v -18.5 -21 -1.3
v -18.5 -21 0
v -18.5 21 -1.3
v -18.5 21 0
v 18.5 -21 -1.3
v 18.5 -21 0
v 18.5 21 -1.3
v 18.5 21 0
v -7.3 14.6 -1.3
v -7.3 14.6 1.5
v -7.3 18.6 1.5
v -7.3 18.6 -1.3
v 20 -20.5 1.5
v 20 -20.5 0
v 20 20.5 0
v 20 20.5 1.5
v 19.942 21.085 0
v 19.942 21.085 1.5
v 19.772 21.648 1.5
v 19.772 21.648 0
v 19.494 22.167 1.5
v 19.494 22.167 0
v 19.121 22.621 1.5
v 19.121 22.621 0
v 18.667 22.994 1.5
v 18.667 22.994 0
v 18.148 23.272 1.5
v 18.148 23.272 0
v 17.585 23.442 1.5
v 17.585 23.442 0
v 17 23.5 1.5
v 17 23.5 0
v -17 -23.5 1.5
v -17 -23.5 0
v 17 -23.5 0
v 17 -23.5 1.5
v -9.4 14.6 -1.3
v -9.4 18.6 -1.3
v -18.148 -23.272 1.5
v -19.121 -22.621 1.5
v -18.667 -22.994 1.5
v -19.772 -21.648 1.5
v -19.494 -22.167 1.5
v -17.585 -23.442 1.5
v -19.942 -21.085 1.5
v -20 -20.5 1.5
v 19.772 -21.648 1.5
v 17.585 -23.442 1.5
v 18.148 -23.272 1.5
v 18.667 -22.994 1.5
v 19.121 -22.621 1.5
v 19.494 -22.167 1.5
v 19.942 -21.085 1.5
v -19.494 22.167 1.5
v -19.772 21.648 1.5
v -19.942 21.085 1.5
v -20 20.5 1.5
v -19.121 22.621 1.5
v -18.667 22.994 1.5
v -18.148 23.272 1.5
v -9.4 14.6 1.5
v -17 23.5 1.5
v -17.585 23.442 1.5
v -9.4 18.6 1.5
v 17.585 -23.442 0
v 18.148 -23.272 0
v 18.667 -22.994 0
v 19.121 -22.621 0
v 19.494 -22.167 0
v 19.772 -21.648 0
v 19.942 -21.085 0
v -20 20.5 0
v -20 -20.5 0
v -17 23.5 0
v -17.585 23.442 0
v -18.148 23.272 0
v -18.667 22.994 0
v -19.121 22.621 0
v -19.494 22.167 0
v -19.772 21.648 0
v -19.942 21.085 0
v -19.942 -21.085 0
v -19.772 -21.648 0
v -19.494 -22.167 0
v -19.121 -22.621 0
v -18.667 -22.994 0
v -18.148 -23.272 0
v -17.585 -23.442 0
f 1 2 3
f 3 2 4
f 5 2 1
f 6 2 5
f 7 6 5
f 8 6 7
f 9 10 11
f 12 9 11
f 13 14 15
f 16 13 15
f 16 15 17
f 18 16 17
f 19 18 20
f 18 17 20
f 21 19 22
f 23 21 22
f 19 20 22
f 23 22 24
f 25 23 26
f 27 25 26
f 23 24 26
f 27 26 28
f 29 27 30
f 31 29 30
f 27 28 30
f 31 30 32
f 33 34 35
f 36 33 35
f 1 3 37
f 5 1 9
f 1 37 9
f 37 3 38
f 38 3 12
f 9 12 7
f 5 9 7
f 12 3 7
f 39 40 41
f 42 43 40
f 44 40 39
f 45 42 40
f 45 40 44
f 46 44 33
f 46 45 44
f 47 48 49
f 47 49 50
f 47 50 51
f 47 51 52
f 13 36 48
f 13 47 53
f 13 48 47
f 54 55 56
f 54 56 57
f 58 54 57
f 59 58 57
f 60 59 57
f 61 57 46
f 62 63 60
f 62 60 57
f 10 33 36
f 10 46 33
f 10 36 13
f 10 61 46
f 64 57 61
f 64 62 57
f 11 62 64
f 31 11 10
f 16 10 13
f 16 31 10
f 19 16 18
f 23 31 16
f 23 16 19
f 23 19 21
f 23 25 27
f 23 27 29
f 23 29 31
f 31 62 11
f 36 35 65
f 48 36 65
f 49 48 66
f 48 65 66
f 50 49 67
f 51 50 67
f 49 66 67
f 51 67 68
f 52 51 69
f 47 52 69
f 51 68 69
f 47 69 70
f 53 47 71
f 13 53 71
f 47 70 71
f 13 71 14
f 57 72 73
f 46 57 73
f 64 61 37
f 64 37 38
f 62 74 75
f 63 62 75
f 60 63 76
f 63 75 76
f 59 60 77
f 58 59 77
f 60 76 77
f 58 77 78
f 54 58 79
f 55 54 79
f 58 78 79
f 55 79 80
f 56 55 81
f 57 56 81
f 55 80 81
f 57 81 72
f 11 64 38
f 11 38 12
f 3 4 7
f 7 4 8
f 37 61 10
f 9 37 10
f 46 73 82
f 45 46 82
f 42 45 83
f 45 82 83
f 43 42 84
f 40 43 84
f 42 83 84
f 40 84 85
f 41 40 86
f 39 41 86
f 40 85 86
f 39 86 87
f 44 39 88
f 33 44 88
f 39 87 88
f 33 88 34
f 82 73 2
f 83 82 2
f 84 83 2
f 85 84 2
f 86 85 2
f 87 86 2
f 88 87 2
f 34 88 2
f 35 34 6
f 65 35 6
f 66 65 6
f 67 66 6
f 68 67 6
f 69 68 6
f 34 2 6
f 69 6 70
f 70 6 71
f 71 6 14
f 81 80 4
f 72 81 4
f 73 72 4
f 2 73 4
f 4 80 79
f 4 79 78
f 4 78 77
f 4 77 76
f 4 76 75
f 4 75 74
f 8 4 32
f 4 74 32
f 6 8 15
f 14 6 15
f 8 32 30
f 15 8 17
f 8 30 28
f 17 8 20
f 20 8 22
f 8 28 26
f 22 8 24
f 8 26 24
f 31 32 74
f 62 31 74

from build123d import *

# Parameters (mm, degrees)
F1_DEPTH = 1.5
F2_W     = 37
F2_H     = 42
F3_DEPTH = 1.3
F4_W     = 2.1
F4_H     = 4
F5_DEPTH = 5.05


with BuildPart() as f1:
    # F0 (on Top) → F1 (new body)
    with BuildSketch(Plane.XY):
        with BuildLine():
            Line((17, 23.5), (-17, 23.5))
            ThreePointArc((-17, 23.5), (-19.12132, 22.62132), (-20, 20.5))
            Line((-20, 20.5), (-20, -20.5))
            ThreePointArc((-20, -20.5), (-19.12132, -22.62132), (-17, -23.5))
            Line((-17, -23.5), (17, -23.5))
            ThreePointArc((17, -23.5), (19.12132, -22.62132), (20, -20.5))
            Line((20, -20.5), (20, 20.5))
            ThreePointArc((20, 20.5), (19.12132, 22.62132), (17, 23.5))
        make_face()
    extrude(amount=F1_DEPTH)

    # F2 (on Top) → F3 (join)
    with BuildSketch(Plane.XY):
        Rectangle(F2_W, F2_H)
    extrude(amount=-F3_DEPTH)

    # F4 (on Top) → F5 (cut, symmetric)
    with BuildSketch(Plane.XY):
        with Locations((-8.35, 16.6)):
            Rectangle(F4_W, F4_H)
    extrude(amount=F5_DEPTH, both=True, mode=Mode.SUBTRACT)


solid = f1.part
